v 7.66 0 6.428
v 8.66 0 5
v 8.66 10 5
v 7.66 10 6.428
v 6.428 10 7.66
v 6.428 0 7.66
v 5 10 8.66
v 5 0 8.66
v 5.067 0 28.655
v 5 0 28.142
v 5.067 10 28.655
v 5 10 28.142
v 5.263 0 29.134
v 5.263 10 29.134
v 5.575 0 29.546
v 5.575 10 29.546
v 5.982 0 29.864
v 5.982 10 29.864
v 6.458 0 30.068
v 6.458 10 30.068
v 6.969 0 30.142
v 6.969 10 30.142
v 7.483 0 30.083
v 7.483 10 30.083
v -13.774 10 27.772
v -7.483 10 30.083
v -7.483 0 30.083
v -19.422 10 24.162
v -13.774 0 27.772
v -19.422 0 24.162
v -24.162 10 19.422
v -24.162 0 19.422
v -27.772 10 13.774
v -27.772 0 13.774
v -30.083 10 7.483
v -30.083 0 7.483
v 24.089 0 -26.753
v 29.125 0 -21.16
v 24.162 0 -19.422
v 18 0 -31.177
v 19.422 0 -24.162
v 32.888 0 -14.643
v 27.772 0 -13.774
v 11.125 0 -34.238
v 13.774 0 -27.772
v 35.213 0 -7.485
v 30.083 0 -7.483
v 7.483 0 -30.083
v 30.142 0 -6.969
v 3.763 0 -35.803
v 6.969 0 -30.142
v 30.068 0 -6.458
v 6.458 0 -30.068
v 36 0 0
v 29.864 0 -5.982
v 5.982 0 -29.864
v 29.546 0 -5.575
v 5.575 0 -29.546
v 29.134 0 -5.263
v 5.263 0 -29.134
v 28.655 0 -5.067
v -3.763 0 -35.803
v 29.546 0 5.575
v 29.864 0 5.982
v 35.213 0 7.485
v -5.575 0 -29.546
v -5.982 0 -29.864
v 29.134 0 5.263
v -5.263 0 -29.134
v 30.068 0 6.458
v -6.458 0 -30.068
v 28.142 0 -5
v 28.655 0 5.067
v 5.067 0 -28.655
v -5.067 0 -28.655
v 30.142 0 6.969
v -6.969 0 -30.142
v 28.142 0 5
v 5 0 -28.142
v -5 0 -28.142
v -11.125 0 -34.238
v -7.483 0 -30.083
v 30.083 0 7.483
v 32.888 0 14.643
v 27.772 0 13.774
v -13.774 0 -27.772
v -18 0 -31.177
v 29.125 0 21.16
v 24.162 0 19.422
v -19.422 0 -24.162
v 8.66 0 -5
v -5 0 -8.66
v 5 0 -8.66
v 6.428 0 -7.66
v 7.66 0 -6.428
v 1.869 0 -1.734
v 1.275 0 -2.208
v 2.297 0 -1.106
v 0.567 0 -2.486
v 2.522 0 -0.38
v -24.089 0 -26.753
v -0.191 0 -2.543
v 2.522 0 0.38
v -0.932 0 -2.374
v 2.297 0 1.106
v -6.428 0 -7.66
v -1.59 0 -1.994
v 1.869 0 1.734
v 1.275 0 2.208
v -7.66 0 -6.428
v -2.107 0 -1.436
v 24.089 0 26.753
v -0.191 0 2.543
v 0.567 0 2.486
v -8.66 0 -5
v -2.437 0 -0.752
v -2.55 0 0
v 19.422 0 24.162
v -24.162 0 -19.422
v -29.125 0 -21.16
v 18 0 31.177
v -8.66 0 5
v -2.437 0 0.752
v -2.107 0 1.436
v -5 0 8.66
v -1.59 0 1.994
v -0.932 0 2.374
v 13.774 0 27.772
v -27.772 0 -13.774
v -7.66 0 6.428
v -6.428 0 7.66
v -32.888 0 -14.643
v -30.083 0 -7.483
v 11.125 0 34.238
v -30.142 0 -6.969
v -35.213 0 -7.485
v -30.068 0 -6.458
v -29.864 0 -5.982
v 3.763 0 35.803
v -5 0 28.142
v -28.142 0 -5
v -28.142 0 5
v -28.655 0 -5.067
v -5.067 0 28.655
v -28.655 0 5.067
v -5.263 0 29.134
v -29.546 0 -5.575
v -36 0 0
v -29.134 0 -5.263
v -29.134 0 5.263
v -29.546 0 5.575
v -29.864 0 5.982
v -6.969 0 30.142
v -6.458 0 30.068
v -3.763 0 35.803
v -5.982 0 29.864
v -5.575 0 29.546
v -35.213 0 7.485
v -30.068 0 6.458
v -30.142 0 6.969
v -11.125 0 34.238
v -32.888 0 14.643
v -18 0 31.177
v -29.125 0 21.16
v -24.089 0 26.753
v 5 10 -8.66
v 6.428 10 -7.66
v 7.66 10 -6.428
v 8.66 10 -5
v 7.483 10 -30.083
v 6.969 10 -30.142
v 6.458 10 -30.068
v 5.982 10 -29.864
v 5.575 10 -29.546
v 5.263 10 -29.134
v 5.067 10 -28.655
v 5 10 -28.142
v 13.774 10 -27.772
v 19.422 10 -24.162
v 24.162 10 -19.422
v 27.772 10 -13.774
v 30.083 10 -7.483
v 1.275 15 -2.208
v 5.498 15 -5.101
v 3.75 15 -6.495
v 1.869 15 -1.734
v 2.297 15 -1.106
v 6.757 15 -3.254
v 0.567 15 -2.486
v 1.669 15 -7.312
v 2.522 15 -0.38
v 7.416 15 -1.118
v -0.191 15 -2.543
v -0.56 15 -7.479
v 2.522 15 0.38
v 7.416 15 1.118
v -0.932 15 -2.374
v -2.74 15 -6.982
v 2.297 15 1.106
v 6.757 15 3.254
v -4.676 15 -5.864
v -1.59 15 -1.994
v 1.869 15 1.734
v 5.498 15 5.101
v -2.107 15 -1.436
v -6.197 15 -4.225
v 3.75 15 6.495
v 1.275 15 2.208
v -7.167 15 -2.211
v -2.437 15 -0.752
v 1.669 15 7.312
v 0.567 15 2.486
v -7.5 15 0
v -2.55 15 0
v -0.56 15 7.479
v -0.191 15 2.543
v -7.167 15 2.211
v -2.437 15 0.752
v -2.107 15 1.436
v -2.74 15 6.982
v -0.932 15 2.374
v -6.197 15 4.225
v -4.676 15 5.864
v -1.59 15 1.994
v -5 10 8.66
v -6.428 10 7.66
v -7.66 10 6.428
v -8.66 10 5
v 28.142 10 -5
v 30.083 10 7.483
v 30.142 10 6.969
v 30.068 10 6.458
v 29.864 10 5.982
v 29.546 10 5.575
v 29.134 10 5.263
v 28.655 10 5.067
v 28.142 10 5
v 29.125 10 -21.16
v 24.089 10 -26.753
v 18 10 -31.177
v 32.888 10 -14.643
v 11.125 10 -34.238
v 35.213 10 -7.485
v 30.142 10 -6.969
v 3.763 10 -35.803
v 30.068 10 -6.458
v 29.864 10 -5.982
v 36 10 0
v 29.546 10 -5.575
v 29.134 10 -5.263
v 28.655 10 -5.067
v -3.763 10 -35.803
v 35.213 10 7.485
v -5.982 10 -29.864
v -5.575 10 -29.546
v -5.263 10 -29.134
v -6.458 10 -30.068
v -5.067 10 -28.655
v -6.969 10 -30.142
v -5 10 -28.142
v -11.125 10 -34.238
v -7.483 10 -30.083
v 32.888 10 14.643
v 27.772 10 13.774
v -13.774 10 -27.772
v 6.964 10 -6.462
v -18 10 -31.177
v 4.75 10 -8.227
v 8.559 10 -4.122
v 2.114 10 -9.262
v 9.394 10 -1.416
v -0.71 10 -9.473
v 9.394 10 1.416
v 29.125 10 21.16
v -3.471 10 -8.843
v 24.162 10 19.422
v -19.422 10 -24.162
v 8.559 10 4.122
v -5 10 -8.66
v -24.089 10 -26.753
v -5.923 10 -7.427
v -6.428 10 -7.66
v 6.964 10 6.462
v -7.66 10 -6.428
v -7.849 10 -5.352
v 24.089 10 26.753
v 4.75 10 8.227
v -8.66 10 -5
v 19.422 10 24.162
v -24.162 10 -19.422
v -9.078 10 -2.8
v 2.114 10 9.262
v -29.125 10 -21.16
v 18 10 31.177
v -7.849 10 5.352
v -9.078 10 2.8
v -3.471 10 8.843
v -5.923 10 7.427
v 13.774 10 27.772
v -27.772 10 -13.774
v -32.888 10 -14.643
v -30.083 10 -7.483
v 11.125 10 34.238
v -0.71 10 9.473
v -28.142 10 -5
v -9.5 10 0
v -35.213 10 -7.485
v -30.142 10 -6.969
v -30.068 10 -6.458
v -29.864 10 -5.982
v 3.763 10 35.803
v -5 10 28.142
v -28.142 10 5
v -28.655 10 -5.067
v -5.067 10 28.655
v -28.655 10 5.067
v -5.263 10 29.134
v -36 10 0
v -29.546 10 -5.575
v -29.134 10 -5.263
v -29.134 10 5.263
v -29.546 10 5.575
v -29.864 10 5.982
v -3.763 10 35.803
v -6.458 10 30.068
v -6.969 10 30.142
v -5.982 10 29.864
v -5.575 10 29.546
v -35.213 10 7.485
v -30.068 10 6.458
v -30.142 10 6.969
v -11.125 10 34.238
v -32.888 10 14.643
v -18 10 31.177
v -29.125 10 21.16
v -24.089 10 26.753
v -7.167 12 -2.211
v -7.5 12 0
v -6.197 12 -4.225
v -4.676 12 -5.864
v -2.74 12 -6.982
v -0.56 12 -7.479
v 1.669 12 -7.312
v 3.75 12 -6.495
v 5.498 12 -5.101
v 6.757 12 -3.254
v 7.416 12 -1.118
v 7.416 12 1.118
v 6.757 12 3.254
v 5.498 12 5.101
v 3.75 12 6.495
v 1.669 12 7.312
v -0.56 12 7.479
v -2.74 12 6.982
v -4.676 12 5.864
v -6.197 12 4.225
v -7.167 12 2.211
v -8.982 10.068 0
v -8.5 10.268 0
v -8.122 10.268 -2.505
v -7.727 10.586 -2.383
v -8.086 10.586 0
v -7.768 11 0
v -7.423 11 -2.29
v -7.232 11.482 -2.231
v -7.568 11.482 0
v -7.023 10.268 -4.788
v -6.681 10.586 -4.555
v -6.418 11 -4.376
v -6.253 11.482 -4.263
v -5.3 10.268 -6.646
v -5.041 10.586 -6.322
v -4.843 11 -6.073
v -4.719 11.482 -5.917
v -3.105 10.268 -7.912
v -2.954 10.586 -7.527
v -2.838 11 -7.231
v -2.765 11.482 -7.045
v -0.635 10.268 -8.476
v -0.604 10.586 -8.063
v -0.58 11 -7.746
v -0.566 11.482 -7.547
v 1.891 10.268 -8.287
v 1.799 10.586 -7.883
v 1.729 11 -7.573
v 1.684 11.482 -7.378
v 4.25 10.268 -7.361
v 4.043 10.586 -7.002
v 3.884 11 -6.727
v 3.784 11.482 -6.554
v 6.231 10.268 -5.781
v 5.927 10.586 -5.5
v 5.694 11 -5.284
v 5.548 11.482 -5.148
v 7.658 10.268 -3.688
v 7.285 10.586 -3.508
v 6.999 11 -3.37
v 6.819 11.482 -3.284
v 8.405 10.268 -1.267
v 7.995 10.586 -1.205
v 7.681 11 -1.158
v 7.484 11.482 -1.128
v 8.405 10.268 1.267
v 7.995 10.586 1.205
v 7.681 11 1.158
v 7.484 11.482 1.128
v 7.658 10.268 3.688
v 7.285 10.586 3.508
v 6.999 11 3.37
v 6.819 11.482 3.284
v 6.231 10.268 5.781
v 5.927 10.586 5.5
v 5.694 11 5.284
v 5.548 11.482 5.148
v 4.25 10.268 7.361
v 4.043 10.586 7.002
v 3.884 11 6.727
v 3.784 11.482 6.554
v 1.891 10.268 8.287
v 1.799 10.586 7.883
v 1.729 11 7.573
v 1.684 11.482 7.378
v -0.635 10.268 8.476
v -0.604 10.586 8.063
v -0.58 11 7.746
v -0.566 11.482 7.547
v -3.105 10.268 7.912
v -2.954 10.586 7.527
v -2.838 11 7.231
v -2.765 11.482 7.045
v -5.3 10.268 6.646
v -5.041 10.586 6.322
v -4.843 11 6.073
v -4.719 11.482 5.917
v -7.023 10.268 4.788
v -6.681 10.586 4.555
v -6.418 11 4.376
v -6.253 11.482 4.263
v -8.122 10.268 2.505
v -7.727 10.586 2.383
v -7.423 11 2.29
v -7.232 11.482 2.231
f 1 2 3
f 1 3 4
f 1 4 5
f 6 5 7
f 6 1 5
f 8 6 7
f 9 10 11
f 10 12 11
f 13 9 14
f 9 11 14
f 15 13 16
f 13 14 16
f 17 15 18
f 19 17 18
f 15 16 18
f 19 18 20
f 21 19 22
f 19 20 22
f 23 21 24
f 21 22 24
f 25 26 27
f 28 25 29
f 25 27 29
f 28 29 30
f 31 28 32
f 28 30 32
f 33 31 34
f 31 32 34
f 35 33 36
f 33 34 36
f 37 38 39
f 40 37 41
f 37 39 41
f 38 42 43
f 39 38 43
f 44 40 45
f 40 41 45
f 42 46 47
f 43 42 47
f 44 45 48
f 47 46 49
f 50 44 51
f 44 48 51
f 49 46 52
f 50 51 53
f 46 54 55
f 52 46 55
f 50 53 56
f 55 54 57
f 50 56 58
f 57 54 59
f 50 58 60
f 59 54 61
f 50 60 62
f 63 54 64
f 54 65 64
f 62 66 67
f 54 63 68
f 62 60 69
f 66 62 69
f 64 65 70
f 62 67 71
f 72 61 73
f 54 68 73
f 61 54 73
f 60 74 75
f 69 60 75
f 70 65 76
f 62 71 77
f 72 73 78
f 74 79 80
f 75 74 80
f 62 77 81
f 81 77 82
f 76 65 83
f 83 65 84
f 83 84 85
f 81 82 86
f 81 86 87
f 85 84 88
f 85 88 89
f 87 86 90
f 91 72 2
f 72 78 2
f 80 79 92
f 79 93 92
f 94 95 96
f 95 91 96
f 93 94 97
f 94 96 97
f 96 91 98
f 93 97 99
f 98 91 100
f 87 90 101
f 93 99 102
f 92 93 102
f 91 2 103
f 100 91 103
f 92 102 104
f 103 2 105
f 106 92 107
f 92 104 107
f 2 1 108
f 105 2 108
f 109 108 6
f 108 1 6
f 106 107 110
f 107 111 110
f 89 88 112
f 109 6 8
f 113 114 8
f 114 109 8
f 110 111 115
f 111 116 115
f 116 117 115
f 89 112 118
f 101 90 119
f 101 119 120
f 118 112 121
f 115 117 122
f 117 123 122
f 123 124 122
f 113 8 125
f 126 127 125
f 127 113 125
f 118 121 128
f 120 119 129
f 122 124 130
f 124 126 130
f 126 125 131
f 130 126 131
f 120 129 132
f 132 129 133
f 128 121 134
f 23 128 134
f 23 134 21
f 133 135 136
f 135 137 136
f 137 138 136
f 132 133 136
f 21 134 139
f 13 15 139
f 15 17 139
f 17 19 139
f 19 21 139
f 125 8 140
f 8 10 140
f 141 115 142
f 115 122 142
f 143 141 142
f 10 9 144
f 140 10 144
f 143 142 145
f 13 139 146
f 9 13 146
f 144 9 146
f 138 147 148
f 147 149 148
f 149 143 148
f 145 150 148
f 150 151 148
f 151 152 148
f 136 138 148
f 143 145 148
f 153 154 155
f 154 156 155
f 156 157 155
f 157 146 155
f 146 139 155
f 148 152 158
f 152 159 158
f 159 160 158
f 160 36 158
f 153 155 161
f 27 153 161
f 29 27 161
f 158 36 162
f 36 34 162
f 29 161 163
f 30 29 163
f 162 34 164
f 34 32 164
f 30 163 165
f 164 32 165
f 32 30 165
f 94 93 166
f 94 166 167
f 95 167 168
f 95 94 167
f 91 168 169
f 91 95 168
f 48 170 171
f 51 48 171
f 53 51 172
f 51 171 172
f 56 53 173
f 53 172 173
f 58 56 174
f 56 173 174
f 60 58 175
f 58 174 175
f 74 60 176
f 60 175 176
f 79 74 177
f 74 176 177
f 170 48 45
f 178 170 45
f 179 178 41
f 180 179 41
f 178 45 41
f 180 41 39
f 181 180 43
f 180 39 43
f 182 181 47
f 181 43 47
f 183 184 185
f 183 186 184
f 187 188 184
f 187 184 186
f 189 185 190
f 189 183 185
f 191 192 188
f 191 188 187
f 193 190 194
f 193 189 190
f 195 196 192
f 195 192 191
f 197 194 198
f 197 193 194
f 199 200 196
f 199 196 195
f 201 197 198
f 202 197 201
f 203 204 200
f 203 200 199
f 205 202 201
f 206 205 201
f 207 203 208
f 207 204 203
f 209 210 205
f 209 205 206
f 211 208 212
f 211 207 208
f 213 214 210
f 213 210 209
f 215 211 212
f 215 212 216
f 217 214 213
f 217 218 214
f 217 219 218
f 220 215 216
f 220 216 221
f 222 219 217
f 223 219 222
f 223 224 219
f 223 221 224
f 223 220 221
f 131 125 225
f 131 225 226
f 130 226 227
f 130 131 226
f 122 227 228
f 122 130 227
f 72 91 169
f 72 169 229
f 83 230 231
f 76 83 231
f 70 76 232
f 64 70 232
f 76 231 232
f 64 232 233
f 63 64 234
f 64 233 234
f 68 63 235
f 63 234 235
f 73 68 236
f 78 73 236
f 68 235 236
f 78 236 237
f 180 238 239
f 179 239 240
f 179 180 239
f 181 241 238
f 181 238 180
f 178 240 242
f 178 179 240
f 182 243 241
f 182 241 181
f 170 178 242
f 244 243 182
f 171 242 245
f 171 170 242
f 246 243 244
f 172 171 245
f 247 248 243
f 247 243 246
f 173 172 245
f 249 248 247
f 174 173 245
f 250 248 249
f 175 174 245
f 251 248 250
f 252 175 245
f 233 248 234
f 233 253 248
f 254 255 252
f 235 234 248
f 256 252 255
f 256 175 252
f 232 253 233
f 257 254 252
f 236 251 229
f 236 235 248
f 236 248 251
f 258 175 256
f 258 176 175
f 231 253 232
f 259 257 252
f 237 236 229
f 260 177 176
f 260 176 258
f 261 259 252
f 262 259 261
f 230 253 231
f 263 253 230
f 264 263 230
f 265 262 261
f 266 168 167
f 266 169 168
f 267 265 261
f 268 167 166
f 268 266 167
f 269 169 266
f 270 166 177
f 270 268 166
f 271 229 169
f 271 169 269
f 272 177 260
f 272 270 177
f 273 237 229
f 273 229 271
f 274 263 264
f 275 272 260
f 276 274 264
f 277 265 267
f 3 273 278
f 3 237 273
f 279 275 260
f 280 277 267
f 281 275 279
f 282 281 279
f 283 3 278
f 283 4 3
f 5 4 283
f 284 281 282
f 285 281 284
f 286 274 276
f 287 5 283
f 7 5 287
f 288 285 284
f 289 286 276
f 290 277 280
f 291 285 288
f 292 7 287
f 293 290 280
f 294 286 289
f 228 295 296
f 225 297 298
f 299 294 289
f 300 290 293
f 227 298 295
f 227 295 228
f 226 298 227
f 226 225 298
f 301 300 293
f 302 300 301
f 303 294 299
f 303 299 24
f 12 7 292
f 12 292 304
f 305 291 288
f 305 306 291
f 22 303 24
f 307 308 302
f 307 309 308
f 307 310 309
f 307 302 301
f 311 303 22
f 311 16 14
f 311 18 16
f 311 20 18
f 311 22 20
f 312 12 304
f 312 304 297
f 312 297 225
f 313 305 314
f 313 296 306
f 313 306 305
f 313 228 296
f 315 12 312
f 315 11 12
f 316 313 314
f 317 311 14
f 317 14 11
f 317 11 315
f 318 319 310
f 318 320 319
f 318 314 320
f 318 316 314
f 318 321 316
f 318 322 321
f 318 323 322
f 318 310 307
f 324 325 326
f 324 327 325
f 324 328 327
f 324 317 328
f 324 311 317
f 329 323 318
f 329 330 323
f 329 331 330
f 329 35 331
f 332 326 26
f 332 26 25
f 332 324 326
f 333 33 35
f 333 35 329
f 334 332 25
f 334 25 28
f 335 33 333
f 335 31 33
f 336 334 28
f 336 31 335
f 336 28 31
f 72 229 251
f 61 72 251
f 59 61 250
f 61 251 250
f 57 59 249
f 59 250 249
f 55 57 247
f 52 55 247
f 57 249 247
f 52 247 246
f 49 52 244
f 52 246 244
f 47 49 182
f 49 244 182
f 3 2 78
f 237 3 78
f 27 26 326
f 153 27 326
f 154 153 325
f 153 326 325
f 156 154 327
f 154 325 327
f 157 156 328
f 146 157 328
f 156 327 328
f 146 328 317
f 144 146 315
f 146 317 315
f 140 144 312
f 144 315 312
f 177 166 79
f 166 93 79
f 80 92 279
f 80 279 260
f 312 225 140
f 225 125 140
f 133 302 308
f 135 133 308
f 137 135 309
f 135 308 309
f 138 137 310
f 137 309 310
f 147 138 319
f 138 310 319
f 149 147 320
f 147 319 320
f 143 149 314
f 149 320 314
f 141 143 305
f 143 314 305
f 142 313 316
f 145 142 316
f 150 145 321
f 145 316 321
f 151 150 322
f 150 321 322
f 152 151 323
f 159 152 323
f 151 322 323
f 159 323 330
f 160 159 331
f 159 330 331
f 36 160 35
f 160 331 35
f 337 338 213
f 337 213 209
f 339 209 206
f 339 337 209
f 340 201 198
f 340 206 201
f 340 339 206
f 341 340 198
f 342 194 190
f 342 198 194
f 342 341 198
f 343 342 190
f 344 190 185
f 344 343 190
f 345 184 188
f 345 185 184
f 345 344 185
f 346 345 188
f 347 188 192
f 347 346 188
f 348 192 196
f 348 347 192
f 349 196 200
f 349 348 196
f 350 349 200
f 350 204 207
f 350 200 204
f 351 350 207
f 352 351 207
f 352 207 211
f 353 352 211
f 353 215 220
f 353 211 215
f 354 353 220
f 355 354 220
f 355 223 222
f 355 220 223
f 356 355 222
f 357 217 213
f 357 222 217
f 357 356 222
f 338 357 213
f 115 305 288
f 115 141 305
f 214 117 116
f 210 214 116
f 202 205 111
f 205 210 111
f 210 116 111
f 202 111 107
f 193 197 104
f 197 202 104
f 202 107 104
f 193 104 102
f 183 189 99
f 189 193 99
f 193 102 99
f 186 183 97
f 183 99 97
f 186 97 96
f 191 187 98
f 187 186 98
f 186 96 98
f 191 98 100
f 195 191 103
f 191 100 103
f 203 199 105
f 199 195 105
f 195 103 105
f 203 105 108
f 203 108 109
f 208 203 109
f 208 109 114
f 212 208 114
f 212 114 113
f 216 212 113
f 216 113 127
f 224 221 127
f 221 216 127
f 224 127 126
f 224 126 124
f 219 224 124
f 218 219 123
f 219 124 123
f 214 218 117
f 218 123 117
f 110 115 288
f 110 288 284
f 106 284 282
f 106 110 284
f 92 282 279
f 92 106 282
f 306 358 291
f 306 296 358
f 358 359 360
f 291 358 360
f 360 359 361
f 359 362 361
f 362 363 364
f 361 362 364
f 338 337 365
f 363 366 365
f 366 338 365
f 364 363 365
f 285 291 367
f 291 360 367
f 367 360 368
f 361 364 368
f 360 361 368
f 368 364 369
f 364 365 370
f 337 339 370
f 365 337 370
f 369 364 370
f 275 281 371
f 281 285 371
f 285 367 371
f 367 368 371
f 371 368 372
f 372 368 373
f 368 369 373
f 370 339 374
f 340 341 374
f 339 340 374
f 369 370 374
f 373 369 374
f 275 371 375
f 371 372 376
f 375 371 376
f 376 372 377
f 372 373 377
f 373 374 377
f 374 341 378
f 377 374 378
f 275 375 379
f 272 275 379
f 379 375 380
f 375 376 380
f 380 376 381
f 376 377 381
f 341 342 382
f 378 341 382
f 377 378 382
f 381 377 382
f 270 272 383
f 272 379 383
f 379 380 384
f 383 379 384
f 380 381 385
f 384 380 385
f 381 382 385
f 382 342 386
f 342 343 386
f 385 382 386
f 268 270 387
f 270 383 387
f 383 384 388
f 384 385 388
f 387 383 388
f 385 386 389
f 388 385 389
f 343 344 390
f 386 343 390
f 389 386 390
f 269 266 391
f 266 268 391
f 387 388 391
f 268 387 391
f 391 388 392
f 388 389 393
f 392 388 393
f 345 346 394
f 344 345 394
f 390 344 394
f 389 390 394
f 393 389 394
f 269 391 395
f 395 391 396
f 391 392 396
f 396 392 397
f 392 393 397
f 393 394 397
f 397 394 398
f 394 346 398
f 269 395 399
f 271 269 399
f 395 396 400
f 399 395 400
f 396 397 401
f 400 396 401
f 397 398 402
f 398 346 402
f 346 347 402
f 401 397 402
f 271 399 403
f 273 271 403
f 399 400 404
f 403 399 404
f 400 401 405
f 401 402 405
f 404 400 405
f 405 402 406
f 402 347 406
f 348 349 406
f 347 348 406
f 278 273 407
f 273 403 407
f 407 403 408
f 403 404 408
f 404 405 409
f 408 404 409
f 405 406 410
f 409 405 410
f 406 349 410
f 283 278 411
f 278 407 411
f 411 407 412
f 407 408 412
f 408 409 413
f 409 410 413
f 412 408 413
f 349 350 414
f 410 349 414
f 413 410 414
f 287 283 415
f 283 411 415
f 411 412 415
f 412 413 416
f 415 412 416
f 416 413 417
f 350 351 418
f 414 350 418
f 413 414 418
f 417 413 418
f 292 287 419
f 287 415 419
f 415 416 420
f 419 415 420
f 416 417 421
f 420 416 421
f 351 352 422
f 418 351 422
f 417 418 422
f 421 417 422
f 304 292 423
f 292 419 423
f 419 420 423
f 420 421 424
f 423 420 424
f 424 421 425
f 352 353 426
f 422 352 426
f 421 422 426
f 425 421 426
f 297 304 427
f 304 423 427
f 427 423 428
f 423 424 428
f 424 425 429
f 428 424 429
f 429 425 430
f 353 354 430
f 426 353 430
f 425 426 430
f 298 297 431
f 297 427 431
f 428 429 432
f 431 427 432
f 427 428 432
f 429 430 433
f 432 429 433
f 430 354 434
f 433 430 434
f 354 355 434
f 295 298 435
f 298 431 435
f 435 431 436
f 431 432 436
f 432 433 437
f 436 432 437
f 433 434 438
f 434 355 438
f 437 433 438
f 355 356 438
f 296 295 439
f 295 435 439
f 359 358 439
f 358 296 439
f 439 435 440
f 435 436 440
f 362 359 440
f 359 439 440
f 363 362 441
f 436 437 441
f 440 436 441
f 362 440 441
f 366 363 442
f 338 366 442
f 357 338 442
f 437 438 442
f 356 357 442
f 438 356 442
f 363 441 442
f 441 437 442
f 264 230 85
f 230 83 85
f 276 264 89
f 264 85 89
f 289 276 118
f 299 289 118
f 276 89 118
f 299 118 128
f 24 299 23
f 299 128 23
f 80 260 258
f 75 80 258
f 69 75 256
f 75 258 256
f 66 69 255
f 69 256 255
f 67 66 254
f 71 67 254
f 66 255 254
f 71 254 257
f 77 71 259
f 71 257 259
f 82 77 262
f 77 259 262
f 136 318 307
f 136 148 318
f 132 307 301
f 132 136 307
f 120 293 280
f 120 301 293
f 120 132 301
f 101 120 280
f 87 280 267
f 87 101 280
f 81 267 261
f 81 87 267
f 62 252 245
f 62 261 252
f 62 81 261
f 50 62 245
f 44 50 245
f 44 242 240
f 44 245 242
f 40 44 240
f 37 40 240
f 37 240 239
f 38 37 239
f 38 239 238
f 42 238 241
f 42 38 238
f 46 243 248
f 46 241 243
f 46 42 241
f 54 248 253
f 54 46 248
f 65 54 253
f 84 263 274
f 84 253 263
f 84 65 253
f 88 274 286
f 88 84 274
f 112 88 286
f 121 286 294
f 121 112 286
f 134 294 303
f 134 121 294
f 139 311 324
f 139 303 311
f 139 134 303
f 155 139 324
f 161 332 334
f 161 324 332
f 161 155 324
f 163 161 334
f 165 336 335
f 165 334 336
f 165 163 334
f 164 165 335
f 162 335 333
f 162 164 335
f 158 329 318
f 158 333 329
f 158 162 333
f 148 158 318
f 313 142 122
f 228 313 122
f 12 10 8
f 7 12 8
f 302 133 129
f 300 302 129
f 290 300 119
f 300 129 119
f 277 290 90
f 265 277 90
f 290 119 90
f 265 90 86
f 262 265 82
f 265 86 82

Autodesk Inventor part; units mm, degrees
ref_plane "YZ Plane" through (0, 0, 0) normal (1, 0, 0) x (0, 1, 0)
ref_plane "XZ Plane" through (0, 0, 0) normal (0, 1, 0) x (-1, 0, 0)
ref_plane "XY Plane" through (0, 0, 0) normal (0, 0, 1) x (1, 0, 0)
sketch "Sketch5" plane through (0, 0, 0) normal (0, 1, 0) x (-1, 0, 0)
  circle A0 centre (0, 0) radius 2.55
  circle A1 centre (0, 0) radius 7.5
  circle A2 centre (0, 0) radius 36
  dimension "d10" = 5.1
  dimension "d11" = 15
  dimension "d12" = 72
extrude "Extrusion4" add sketch "Sketch5" along normal blind 10 contours A2
extrude "Extrusion5" add sketch "Sketch5" along normal blind 15 contours A1
sketch "Sketch6" plane through (0, 0, 0) normal (0, -1, 0) x (1, 0, 0)
  circle A0 centre (0, 0) radius 10
  circle A1 centre (0, 0) radius 2.55 projected
  circle A2 centre (0, 0) radius 36
  circle A3 centre (0, 0) radius 2.55 projected
  circle A4 centre (0, 0) radius 31
  line L0 (-30.5941, 5) -> (-10, 5)
  line L1 (-30.5941, -5) -> (-10, -5)
  line L2 (-10, -5) -> (-8.6603, -5)
  line L3 (-10, 5) -> (-8.6603, 5)
  circle A5 centre (0, 0) radius 10
  line L4 (8.6603, -5) -> (30.5941, -5)
  line L5 (8.6603, 5) -> (30.5941, 5)
  line L6 (5, 10) -> (5, 30.5941)
  line L7 (5, 10) -> (5, 8.6603)
  line L8 (5, -8.6603) -> (5, -30.5941)
  line L9 (-5, 8.6603) -> (-5, 30.5941)
  line L10 (-5, -8.6603) -> (-5, -30.5941)
  dimension "d17" = 20
extrude "Extrusion6" cut sketch "Sketch6" against normal up to surface (10 mm away) contours A0 L7 L6 A4 L5 | L4 A4 L8 A0 | A0 L3 L0 A4 L9 | L10 A4 L1 L2 A0
fillet "Fillet1" radius 2 8 edges at (-5, 5, -30.5941) (-30.5941, 5, -5) (-30.5941, 5, 5) (-5, 5, 30.5941) (5, 5, 30.5941) (30.5941, 5, 5) (30.5941, 5, -5) (5, 5, -30.5941)
fillet "Fillet2" radius 2 1 edges at (7.5, 10, 0)
properties part number "wheel"
